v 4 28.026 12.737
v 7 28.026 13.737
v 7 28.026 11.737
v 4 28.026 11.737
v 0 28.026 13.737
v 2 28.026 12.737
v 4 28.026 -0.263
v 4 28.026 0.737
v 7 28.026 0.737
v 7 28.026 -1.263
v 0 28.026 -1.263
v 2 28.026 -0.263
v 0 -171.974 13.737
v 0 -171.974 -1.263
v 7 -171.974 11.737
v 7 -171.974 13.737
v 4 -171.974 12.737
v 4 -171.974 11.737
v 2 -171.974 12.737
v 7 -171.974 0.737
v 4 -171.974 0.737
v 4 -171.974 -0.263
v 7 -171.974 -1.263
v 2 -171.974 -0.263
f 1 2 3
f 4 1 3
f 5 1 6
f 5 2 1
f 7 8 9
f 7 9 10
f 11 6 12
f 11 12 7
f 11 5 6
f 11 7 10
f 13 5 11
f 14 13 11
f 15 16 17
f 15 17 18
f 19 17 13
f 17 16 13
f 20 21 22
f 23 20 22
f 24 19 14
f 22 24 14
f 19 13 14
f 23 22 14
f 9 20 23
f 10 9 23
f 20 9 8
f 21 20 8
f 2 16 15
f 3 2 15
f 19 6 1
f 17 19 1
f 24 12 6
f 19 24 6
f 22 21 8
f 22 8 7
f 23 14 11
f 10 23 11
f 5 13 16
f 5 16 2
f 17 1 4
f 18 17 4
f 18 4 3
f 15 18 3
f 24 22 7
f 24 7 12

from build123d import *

# Parameters (mm, degrees)
CROQUIS1_W              = 15
CROQUIS1_H              = 200
SALIENTE_EXTRUIR1_DEPTH = 7
CORTAR_EXTRUIR1_DEPTH   = 201.593371852


with BuildPart() as part:
    # Croquis1 → Saliente-Extruir1 (new body)
    with BuildSketch(Plane(origin=(0, 0, 0), x_dir=(0, 0, -1), z_dir=(1, 0, 0))):
        with Locations((-6.236842105, -71.973684211)):
            Rectangle(CROQUIS1_W, CROQUIS1_H)
    extrude(amount=SALIENTE_EXTRUIR1_DEPTH)

    # Croquis2 → Cortar-Extruir1 (cut, through all)
    with BuildSketch(Plane(origin=(0, 28.026315789, 0), x_dir=(1, 0, 0), z_dir=(0, 1, 0))):
        Polygon((7, -0.736842105), (4, -0.736842105), (4, 0.263157895), (2, 0.263157895), (2, -12.736842105), (4, -12.736842105), (4, -11.736842105), (7, -11.736842105), align=None)
    extrude(amount=-CORTAR_EXTRUIR1_DEPTH, mode=Mode.SUBTRACT)


solid = part.part
